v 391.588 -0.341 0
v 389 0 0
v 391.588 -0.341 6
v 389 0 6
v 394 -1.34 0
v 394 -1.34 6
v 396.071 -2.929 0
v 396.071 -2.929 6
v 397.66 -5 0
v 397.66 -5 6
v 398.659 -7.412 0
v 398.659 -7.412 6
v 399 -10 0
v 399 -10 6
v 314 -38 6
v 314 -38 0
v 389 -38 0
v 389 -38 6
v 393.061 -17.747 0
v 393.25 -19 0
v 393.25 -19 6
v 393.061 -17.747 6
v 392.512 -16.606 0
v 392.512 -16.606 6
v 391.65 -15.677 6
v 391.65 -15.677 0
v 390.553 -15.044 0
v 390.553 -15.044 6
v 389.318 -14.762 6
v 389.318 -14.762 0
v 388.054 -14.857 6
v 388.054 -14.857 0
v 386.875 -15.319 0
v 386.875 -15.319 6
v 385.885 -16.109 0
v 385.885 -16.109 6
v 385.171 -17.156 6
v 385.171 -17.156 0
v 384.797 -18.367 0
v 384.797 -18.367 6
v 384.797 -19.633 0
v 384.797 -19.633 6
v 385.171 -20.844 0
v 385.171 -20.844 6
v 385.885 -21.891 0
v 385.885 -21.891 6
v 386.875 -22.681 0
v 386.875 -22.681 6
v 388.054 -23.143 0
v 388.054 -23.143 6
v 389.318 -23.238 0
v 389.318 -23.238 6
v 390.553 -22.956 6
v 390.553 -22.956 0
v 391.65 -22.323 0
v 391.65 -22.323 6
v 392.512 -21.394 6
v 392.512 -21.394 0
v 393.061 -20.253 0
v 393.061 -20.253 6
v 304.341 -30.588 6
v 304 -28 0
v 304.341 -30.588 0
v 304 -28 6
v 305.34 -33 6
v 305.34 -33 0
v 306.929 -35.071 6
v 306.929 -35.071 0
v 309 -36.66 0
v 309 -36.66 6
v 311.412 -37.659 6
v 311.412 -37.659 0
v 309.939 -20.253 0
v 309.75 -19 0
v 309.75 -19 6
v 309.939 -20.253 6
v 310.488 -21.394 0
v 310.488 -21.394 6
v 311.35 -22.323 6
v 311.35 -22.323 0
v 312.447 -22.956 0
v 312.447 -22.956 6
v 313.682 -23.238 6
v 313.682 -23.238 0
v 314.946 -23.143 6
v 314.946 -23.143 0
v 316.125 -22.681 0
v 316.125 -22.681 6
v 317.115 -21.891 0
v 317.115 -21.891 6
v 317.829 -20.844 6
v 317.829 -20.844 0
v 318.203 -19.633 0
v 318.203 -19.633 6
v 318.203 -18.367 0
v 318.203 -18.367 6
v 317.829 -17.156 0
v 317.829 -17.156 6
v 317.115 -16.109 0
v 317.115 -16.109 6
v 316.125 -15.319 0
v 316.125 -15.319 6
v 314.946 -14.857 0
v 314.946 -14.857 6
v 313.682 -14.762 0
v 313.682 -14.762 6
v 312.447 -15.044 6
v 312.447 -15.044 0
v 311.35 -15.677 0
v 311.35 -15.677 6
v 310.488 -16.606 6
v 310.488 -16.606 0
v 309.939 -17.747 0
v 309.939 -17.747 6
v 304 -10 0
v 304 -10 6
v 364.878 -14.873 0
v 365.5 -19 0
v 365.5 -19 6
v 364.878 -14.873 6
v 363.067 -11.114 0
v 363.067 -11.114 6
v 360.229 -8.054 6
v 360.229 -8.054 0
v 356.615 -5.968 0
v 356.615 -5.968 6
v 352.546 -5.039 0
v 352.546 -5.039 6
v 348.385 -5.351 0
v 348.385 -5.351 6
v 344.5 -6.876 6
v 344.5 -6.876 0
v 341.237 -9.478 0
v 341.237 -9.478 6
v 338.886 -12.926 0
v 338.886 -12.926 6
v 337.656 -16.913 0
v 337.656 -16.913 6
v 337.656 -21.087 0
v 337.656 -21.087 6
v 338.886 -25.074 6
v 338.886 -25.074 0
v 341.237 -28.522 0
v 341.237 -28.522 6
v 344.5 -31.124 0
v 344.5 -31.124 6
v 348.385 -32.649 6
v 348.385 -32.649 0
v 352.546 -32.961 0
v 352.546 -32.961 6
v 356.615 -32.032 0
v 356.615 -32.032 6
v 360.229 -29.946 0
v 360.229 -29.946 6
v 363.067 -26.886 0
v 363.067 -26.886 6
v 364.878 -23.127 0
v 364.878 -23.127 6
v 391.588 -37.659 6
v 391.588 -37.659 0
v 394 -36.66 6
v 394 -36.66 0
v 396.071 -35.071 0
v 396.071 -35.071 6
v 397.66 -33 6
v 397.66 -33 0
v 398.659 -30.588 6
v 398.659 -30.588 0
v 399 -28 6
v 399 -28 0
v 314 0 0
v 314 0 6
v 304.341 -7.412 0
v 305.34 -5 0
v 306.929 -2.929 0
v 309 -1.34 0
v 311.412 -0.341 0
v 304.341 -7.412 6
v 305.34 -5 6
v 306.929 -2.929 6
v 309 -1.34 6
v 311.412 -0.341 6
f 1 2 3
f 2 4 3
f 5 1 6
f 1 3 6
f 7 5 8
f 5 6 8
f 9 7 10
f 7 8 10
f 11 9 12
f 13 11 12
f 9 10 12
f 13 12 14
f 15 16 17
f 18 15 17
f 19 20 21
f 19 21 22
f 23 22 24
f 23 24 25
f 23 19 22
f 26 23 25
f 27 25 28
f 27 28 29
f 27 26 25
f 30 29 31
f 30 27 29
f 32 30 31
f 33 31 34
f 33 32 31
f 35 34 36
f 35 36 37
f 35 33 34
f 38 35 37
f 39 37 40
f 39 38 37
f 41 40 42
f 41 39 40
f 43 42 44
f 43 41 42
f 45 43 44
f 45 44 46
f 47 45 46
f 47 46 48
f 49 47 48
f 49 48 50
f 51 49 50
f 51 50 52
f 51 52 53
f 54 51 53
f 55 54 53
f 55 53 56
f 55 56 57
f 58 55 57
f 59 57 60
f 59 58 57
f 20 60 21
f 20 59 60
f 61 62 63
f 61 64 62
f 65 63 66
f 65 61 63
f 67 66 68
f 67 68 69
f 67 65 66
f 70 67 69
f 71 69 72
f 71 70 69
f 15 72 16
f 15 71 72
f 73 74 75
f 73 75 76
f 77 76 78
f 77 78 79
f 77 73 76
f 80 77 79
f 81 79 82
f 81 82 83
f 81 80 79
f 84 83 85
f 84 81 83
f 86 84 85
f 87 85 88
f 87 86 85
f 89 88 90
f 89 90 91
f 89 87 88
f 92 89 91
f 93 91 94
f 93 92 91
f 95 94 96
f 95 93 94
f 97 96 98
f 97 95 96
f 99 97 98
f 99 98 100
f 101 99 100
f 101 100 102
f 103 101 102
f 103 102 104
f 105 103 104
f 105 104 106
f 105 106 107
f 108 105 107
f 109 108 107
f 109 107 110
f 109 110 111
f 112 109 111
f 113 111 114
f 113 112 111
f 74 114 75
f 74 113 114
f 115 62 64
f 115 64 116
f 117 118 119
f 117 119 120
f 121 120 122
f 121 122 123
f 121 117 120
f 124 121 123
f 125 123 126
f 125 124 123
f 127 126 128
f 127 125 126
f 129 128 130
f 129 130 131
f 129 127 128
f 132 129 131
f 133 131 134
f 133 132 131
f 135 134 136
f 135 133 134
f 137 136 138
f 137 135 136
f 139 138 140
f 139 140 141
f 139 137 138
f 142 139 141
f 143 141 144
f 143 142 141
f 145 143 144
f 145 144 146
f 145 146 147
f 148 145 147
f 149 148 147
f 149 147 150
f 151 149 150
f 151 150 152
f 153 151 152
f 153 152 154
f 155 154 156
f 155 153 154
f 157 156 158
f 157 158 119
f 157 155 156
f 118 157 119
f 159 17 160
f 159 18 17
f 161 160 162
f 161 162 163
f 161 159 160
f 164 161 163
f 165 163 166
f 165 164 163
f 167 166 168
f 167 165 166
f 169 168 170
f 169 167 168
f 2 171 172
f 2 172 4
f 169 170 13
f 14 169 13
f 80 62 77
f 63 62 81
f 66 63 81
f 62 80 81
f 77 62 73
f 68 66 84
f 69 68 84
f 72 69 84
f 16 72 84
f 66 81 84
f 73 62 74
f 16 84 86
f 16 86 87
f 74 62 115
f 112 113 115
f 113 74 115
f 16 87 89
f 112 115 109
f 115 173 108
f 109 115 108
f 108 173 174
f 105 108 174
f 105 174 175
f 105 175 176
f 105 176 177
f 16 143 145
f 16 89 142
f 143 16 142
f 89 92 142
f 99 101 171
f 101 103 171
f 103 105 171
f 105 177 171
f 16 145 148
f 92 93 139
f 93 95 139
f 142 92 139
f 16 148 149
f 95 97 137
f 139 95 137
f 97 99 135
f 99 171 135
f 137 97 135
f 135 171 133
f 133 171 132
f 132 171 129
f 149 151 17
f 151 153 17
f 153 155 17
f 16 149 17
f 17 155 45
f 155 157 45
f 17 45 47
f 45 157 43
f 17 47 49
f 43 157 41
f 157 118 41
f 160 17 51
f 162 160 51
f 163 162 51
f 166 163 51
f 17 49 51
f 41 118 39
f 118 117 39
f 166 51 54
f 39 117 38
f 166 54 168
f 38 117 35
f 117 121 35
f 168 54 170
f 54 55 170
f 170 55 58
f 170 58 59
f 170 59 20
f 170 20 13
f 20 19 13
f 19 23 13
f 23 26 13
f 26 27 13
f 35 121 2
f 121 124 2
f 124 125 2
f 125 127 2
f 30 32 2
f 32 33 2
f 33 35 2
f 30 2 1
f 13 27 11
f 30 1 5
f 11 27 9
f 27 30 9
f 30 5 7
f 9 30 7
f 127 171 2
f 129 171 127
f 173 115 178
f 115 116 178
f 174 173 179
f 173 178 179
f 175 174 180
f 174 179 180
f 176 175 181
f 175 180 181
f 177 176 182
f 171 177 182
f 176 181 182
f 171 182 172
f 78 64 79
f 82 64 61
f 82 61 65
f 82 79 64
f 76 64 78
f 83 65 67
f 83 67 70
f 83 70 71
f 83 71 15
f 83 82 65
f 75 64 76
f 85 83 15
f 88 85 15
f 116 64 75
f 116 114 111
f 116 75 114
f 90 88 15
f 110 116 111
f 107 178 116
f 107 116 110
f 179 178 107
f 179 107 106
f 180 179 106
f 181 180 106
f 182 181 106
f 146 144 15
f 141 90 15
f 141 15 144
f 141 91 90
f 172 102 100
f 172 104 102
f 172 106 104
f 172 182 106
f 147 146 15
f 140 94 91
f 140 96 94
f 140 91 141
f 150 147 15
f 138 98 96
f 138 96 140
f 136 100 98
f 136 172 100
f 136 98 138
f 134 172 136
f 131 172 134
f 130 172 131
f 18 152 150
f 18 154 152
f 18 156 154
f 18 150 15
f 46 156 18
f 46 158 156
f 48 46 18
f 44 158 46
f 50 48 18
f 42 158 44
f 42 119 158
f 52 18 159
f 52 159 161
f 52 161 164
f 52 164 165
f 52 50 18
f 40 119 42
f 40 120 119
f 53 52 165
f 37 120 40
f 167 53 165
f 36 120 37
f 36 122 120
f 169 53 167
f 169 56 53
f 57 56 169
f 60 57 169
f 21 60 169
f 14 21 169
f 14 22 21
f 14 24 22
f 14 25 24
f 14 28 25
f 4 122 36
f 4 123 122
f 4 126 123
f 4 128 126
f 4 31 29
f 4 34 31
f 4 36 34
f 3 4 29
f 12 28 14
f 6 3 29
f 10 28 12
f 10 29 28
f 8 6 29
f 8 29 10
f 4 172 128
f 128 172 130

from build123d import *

# Parameters (mm, degrees)
SKETCH1_W           = 95
SKETCH1_H           = 38
SKETCH1_R           = 14
SKETCH1_R_2         = 4.25
BOSS_EXTRUDE1_DEPTH = 6
FILLET1_R           = 10


with BuildPart() as part:
    # Sketch1 → Boss-Extrude1 (new body)
    with BuildSketch(Plane.XY):
        with Locations((351.5, -19)):
            Rectangle(SKETCH1_W, SKETCH1_H)
        with Locations((351.5, -19)):
            Circle(SKETCH1_R, mode=Mode.SUBTRACT)
        with Locations((389, -19)):
            Circle(SKETCH1_R_2, mode=Mode.SUBTRACT)
        with Locations(Location((314, -19, 0), (0, 0, 180))):
            Circle(SKETCH1_R_2, mode=Mode.SUBTRACT)
    extrude(amount=BOSS_EXTRUDE1_DEPTH)

    # Fillet1
    fillet1_edges = [part.edges().sort_by_distance(p)[0] for p in [
        (399, -38, 3),
        (304, -38, 3),
        (304, 0, 3),
        (399, 0, 3),
    ]]
    fillet(fillet1_edges, radius=FILLET1_R)


solid = part.part
